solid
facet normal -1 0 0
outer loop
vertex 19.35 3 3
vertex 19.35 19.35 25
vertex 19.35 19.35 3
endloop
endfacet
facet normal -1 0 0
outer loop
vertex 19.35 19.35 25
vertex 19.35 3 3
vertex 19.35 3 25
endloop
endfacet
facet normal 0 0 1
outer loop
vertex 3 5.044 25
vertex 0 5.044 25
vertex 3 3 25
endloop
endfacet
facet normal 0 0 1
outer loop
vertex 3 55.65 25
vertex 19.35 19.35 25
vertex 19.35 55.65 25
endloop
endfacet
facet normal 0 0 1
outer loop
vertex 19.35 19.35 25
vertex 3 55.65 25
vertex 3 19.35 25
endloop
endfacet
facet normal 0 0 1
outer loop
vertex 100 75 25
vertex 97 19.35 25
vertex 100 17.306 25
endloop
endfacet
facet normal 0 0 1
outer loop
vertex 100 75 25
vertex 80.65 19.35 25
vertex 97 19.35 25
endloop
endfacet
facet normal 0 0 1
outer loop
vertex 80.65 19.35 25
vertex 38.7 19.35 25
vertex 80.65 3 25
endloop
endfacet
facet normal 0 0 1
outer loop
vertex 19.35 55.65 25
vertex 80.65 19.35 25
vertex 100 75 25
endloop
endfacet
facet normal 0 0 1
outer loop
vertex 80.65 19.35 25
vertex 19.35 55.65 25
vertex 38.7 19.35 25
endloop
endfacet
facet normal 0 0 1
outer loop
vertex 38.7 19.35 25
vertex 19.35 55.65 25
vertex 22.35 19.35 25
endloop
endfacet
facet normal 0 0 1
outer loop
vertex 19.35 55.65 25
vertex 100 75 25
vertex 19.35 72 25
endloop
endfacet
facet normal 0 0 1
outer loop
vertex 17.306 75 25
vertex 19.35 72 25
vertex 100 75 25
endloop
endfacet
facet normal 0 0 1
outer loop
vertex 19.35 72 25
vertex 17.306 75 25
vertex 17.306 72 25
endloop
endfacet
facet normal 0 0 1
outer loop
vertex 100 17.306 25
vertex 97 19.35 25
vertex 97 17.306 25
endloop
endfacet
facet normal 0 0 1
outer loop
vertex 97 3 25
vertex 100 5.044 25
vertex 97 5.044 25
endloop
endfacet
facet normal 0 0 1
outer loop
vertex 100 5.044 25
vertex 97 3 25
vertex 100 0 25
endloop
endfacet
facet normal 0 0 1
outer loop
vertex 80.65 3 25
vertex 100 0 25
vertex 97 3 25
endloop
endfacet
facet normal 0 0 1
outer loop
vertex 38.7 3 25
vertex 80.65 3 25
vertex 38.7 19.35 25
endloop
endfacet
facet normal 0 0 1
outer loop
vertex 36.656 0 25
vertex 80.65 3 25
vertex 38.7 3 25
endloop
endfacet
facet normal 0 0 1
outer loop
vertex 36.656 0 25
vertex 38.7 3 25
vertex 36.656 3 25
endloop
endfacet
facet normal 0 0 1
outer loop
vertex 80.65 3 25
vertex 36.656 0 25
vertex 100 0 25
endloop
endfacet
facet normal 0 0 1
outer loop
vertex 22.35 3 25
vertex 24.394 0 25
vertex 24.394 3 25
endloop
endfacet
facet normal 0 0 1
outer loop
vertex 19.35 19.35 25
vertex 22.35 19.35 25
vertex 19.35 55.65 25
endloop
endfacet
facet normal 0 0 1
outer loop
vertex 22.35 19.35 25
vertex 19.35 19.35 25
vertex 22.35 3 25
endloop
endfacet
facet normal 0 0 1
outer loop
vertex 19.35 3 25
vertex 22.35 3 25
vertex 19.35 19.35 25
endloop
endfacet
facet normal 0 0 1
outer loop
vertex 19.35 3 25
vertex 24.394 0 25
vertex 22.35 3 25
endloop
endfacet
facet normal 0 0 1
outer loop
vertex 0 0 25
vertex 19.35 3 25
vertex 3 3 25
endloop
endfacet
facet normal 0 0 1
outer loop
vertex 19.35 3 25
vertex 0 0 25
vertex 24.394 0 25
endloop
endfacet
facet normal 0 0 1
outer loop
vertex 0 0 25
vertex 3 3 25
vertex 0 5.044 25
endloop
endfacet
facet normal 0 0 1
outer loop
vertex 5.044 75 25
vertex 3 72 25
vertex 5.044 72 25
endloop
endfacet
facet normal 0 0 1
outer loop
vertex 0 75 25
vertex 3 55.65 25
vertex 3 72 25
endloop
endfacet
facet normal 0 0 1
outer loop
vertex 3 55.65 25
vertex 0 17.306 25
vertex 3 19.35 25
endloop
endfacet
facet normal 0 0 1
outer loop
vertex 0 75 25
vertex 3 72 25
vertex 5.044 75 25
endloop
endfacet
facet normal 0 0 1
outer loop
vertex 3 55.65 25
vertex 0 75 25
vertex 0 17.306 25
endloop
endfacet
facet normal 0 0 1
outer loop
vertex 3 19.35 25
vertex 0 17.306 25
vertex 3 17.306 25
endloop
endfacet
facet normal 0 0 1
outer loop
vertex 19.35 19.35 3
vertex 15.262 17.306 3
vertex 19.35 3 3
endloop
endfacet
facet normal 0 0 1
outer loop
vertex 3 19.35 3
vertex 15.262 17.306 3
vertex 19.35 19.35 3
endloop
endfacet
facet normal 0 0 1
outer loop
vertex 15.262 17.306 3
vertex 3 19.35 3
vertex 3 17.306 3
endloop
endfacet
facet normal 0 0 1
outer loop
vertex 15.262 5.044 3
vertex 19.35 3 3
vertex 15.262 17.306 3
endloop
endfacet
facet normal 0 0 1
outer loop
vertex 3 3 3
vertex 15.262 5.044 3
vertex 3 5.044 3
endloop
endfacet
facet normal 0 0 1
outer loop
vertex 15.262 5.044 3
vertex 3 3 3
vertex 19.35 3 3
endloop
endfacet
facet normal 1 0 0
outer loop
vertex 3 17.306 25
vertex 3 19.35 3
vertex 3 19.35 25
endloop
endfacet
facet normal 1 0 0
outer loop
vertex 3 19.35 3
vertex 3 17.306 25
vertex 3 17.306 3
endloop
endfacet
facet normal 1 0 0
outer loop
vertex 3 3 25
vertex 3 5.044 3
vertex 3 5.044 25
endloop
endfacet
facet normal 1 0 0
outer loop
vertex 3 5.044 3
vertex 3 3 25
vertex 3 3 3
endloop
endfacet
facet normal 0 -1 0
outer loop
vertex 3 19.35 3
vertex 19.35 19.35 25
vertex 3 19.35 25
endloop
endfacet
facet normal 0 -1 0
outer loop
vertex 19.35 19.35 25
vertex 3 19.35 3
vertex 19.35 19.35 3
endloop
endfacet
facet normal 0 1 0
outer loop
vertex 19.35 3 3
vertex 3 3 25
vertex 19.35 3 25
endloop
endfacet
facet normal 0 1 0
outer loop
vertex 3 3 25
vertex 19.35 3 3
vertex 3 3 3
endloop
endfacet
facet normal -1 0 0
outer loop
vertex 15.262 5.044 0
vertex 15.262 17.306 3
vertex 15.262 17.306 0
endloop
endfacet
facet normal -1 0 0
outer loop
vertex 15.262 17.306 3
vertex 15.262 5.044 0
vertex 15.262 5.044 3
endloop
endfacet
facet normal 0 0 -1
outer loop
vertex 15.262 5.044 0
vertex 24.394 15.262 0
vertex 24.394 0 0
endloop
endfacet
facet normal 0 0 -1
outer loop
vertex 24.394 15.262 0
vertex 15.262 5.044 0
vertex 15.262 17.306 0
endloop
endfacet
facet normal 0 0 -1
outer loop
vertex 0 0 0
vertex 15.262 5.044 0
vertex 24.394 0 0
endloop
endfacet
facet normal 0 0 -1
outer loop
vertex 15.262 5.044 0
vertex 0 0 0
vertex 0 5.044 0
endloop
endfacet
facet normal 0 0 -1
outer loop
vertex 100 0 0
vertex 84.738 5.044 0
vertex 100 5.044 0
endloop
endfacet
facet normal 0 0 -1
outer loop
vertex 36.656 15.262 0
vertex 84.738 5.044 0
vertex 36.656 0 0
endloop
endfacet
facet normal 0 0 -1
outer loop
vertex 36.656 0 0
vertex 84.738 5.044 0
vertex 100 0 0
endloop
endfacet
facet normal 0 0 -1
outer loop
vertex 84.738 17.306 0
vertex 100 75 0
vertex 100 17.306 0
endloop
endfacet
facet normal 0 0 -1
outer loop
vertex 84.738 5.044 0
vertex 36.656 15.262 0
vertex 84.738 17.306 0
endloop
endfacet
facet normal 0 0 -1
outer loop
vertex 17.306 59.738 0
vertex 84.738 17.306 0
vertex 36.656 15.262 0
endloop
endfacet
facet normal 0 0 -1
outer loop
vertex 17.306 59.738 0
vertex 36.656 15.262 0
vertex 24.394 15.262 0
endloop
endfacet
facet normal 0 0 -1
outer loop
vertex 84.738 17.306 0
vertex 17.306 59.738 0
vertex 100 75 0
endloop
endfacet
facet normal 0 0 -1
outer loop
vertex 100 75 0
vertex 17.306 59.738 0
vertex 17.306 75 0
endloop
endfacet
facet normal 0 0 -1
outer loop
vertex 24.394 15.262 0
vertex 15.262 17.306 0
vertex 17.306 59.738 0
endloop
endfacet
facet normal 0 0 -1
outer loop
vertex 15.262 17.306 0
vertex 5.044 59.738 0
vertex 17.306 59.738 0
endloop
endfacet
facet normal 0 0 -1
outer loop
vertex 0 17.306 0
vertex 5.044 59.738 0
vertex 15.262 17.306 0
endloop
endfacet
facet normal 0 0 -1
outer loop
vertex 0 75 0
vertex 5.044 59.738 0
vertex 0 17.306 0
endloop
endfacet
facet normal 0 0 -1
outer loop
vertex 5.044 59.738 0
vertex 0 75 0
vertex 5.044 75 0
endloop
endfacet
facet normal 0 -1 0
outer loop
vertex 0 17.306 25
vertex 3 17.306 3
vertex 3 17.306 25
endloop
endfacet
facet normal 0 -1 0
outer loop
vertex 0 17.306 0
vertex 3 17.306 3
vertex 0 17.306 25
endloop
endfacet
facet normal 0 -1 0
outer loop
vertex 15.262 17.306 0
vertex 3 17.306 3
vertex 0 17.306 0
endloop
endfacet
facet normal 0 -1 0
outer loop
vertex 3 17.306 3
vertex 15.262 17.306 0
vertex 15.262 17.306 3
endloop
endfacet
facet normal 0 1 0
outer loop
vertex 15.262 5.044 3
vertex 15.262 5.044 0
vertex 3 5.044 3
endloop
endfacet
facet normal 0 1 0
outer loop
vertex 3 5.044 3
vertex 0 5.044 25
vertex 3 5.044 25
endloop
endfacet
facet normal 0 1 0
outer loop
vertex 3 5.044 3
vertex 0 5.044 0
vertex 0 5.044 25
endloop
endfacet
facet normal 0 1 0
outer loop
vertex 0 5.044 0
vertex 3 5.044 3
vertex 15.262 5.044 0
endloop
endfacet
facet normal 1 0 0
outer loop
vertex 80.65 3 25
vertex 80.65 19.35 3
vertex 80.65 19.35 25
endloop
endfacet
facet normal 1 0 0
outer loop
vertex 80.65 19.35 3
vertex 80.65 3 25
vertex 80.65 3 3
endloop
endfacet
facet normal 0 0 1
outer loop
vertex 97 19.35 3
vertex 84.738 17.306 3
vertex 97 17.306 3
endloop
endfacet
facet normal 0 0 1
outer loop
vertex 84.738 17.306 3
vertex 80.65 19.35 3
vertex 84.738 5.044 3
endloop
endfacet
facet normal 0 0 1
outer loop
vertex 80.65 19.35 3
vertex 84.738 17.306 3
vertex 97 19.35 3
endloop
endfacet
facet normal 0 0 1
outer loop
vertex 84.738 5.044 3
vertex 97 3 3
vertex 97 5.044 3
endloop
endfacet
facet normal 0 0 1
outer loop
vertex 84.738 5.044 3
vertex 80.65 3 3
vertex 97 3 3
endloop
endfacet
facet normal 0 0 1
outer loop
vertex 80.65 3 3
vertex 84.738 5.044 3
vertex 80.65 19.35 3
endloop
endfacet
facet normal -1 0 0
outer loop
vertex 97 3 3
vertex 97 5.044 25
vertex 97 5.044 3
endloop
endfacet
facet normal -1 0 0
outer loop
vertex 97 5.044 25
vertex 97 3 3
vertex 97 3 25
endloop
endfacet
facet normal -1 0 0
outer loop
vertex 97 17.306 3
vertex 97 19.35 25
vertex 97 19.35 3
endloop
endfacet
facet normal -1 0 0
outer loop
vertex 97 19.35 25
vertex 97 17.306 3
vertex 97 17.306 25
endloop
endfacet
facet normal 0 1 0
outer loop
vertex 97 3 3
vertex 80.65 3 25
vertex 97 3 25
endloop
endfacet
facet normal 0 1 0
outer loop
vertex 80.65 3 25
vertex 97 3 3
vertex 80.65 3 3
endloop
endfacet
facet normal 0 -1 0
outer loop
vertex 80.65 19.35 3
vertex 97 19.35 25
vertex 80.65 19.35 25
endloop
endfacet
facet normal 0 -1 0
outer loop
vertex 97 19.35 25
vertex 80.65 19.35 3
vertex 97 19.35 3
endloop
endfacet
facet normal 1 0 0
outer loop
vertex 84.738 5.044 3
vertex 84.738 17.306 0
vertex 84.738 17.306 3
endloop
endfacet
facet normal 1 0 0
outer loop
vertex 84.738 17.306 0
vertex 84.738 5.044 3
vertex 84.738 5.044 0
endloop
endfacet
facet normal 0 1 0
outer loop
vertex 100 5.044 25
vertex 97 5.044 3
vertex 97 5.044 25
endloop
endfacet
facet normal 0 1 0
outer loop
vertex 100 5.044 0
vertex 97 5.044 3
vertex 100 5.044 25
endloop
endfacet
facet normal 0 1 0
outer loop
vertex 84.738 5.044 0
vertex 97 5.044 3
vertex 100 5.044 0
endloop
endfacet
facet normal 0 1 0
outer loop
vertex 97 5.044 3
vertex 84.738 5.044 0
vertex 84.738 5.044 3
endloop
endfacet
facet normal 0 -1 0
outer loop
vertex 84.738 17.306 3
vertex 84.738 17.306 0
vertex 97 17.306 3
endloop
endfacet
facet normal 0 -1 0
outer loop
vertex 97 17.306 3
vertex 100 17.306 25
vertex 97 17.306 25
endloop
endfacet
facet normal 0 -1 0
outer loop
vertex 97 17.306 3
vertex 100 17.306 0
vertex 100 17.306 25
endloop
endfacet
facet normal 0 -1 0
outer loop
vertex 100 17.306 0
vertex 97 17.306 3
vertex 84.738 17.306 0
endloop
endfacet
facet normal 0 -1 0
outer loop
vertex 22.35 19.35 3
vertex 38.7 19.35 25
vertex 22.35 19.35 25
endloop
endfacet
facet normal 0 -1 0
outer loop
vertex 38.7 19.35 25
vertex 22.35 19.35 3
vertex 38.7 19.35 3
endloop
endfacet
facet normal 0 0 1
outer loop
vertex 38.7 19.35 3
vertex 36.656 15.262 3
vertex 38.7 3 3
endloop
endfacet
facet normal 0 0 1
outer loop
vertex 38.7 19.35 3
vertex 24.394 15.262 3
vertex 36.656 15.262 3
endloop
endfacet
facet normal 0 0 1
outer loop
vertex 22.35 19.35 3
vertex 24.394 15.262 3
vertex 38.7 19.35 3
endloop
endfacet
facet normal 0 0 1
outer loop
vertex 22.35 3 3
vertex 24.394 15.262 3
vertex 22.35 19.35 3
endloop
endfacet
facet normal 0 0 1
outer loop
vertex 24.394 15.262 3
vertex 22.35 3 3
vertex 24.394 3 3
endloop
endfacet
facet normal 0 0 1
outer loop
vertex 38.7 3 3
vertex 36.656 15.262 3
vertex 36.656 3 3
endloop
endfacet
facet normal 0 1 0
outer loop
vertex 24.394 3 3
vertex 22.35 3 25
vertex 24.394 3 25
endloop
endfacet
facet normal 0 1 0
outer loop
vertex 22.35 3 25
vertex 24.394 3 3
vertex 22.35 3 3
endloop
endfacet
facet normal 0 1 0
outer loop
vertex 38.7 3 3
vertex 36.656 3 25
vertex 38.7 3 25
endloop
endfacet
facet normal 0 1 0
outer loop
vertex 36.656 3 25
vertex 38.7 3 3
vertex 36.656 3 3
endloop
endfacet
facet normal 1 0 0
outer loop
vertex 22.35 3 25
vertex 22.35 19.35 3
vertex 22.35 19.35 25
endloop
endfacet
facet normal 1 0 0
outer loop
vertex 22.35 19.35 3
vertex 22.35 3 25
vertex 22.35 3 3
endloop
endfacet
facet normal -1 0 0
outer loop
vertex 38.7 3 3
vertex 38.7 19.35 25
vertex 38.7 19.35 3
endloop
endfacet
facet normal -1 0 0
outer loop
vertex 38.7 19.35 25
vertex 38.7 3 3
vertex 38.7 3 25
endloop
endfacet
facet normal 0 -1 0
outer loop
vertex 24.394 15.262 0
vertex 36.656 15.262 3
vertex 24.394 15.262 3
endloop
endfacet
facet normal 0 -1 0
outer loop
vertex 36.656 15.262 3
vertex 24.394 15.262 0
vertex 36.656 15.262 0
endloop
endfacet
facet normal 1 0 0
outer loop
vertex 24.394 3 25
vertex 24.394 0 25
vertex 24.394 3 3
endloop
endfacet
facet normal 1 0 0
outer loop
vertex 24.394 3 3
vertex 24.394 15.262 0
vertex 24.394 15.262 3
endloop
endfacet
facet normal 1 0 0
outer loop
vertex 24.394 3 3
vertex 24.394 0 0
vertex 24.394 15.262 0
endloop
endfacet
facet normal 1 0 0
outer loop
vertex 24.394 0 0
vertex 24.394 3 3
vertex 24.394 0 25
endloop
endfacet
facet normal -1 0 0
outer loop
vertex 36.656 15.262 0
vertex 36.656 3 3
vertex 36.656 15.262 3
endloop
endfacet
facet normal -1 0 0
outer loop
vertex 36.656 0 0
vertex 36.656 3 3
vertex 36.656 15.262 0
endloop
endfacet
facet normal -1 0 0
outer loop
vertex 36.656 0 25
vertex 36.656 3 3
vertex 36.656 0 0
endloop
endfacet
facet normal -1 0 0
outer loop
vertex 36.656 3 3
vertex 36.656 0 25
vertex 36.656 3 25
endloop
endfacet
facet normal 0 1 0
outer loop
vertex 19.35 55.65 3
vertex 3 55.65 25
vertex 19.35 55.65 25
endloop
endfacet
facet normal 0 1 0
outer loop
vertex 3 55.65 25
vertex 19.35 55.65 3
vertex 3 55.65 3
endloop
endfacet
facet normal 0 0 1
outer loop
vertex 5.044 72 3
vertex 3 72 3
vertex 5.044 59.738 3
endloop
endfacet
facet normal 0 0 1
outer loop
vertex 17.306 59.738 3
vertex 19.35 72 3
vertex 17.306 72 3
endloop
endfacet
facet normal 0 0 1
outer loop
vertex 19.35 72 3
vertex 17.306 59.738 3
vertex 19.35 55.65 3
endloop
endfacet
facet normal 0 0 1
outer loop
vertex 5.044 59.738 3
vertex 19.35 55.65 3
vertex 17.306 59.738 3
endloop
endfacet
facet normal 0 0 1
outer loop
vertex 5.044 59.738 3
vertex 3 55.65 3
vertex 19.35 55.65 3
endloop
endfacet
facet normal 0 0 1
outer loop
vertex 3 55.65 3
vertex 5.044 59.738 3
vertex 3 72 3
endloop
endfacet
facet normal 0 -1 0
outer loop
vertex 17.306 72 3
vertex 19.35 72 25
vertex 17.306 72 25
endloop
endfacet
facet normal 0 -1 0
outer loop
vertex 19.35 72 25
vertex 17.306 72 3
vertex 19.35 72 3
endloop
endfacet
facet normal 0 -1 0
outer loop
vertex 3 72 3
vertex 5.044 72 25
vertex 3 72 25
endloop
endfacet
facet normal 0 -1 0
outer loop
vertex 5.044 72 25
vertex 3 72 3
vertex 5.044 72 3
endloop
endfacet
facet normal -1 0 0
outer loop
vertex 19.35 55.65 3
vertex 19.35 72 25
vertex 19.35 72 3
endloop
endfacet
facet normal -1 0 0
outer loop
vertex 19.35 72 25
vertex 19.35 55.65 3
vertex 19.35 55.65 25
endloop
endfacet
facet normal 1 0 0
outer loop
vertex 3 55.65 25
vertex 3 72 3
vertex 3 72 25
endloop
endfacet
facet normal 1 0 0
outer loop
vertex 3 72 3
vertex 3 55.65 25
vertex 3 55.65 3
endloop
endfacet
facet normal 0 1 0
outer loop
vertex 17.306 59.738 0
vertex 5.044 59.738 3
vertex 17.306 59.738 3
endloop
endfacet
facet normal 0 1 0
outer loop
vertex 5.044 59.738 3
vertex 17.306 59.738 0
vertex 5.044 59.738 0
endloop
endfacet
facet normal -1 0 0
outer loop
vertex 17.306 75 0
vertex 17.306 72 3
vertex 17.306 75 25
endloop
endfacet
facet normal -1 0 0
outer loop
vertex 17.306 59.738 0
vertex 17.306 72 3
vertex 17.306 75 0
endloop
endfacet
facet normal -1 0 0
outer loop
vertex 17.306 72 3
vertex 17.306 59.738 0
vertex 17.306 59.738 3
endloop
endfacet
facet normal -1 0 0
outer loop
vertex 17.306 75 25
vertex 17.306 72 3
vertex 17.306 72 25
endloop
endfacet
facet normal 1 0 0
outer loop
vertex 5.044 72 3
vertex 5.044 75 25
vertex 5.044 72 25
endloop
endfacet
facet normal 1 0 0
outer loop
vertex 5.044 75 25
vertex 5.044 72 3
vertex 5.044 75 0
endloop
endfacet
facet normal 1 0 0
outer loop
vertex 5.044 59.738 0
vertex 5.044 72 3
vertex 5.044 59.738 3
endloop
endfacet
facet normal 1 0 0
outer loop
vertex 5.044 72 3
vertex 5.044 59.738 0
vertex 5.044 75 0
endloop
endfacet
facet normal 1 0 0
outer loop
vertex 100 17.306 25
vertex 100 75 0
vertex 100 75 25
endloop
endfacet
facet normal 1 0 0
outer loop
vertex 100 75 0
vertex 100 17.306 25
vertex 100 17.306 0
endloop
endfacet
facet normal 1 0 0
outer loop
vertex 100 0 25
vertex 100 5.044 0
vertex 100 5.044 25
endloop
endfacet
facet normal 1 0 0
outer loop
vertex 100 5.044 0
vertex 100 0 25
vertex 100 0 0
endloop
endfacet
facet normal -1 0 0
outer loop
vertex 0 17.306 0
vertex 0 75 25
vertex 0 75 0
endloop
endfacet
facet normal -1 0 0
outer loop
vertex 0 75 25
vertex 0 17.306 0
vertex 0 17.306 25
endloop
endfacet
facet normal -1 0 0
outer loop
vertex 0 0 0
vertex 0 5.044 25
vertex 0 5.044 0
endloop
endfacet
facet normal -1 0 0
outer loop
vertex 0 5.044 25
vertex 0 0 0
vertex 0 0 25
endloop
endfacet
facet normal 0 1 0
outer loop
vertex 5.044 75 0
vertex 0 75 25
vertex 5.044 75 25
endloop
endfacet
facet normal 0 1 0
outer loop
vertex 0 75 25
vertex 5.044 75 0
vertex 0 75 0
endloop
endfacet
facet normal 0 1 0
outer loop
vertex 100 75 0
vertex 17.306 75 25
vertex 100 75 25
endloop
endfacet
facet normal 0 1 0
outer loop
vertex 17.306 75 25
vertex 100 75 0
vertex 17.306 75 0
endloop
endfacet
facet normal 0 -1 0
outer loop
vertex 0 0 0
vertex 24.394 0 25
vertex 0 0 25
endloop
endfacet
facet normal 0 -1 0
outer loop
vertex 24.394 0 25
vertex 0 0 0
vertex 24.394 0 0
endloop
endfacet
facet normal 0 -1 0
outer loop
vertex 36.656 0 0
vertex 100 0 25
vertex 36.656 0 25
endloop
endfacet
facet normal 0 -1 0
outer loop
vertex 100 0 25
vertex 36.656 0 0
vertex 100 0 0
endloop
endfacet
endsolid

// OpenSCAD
// file: ColonistsGoodsBase.scad
singleGoodPileHeight = 2.15;
singleGoodPileWidth = 15.05 + 1.3;
singleGoodPileLength = 15.05 + 1.3;
goodPileCount = 10;
goodPileHeight = (goodPileCount * singleGoodPileHeight) + .5;
module LeftGoodPile(wallThickness, totalHeight){
//    15.05 by 14.95 by 2.15

    openingSize = singleGoodPileWidth * .75;
    blockerSize = (singleGoodPileLength - openingSize) / 2;
    
    translate([wallThickness, wallThickness, totalHeight - goodPileHeight])
        cube([singleGoodPileLength, singleGoodPileWidth, goodPileHeight]);
    translate([-.00001, wallThickness + (blockerSize), 0])
        cube([wallThickness + openingSize, openingSize, totalHeight]);
}

module RightGoodPile(wallThickness, totalHeight){
    translate([0, wallThickness + wallThickness + singleGoodPileWidth, 0])
        rotate([0, 0, 180])
            LeftGoodPile(wallThickness, totalHeight);
}

module BottomGoodPile(wallThickness, totalHeight){
    translate([wallThickness + wallThickness + singleGoodPileWidth, 0, 0])
        rotate([0, 0, 90])
            LeftGoodPile(wallThickness, totalHeight);
}

module TopGoodPile(wallThickness, totalHeight){
//    translate([
//        wallThickness + wallThickness + singleGoodPileWidth,
//        wallThickness + wallThickness + singleGoodPileWidth,
//        0])
        rotate([0, 0, 270])
            LeftGoodPile(wallThickness, totalHeight);
}
// main file
include<ColonistsGoodsBase.scad>
difference() {
    testBoxHeight = goodPileHeight + 3;
    testBoxLength = 100;
    testBoxWidth = 75;
    wallThickness = 3;
    
    cube([testBoxLength, testBoxWidth, testBoxHeight]);
    LeftGoodPile(wallThickness, testBoxHeight);
//    translate([100 - (15.05 + .8), 0, 0])
    translate([testBoxLength, 0, 0])
        RightGoodPile(wallThickness, testBoxHeight);
    translate([singleGoodPileLength + wallThickness, 0, 0])
        BottomGoodPile(wallThickness, testBoxHeight);
    translate([0, testBoxWidth, 0])
        TopGoodPile(wallThickness, testBoxHeight);
}
